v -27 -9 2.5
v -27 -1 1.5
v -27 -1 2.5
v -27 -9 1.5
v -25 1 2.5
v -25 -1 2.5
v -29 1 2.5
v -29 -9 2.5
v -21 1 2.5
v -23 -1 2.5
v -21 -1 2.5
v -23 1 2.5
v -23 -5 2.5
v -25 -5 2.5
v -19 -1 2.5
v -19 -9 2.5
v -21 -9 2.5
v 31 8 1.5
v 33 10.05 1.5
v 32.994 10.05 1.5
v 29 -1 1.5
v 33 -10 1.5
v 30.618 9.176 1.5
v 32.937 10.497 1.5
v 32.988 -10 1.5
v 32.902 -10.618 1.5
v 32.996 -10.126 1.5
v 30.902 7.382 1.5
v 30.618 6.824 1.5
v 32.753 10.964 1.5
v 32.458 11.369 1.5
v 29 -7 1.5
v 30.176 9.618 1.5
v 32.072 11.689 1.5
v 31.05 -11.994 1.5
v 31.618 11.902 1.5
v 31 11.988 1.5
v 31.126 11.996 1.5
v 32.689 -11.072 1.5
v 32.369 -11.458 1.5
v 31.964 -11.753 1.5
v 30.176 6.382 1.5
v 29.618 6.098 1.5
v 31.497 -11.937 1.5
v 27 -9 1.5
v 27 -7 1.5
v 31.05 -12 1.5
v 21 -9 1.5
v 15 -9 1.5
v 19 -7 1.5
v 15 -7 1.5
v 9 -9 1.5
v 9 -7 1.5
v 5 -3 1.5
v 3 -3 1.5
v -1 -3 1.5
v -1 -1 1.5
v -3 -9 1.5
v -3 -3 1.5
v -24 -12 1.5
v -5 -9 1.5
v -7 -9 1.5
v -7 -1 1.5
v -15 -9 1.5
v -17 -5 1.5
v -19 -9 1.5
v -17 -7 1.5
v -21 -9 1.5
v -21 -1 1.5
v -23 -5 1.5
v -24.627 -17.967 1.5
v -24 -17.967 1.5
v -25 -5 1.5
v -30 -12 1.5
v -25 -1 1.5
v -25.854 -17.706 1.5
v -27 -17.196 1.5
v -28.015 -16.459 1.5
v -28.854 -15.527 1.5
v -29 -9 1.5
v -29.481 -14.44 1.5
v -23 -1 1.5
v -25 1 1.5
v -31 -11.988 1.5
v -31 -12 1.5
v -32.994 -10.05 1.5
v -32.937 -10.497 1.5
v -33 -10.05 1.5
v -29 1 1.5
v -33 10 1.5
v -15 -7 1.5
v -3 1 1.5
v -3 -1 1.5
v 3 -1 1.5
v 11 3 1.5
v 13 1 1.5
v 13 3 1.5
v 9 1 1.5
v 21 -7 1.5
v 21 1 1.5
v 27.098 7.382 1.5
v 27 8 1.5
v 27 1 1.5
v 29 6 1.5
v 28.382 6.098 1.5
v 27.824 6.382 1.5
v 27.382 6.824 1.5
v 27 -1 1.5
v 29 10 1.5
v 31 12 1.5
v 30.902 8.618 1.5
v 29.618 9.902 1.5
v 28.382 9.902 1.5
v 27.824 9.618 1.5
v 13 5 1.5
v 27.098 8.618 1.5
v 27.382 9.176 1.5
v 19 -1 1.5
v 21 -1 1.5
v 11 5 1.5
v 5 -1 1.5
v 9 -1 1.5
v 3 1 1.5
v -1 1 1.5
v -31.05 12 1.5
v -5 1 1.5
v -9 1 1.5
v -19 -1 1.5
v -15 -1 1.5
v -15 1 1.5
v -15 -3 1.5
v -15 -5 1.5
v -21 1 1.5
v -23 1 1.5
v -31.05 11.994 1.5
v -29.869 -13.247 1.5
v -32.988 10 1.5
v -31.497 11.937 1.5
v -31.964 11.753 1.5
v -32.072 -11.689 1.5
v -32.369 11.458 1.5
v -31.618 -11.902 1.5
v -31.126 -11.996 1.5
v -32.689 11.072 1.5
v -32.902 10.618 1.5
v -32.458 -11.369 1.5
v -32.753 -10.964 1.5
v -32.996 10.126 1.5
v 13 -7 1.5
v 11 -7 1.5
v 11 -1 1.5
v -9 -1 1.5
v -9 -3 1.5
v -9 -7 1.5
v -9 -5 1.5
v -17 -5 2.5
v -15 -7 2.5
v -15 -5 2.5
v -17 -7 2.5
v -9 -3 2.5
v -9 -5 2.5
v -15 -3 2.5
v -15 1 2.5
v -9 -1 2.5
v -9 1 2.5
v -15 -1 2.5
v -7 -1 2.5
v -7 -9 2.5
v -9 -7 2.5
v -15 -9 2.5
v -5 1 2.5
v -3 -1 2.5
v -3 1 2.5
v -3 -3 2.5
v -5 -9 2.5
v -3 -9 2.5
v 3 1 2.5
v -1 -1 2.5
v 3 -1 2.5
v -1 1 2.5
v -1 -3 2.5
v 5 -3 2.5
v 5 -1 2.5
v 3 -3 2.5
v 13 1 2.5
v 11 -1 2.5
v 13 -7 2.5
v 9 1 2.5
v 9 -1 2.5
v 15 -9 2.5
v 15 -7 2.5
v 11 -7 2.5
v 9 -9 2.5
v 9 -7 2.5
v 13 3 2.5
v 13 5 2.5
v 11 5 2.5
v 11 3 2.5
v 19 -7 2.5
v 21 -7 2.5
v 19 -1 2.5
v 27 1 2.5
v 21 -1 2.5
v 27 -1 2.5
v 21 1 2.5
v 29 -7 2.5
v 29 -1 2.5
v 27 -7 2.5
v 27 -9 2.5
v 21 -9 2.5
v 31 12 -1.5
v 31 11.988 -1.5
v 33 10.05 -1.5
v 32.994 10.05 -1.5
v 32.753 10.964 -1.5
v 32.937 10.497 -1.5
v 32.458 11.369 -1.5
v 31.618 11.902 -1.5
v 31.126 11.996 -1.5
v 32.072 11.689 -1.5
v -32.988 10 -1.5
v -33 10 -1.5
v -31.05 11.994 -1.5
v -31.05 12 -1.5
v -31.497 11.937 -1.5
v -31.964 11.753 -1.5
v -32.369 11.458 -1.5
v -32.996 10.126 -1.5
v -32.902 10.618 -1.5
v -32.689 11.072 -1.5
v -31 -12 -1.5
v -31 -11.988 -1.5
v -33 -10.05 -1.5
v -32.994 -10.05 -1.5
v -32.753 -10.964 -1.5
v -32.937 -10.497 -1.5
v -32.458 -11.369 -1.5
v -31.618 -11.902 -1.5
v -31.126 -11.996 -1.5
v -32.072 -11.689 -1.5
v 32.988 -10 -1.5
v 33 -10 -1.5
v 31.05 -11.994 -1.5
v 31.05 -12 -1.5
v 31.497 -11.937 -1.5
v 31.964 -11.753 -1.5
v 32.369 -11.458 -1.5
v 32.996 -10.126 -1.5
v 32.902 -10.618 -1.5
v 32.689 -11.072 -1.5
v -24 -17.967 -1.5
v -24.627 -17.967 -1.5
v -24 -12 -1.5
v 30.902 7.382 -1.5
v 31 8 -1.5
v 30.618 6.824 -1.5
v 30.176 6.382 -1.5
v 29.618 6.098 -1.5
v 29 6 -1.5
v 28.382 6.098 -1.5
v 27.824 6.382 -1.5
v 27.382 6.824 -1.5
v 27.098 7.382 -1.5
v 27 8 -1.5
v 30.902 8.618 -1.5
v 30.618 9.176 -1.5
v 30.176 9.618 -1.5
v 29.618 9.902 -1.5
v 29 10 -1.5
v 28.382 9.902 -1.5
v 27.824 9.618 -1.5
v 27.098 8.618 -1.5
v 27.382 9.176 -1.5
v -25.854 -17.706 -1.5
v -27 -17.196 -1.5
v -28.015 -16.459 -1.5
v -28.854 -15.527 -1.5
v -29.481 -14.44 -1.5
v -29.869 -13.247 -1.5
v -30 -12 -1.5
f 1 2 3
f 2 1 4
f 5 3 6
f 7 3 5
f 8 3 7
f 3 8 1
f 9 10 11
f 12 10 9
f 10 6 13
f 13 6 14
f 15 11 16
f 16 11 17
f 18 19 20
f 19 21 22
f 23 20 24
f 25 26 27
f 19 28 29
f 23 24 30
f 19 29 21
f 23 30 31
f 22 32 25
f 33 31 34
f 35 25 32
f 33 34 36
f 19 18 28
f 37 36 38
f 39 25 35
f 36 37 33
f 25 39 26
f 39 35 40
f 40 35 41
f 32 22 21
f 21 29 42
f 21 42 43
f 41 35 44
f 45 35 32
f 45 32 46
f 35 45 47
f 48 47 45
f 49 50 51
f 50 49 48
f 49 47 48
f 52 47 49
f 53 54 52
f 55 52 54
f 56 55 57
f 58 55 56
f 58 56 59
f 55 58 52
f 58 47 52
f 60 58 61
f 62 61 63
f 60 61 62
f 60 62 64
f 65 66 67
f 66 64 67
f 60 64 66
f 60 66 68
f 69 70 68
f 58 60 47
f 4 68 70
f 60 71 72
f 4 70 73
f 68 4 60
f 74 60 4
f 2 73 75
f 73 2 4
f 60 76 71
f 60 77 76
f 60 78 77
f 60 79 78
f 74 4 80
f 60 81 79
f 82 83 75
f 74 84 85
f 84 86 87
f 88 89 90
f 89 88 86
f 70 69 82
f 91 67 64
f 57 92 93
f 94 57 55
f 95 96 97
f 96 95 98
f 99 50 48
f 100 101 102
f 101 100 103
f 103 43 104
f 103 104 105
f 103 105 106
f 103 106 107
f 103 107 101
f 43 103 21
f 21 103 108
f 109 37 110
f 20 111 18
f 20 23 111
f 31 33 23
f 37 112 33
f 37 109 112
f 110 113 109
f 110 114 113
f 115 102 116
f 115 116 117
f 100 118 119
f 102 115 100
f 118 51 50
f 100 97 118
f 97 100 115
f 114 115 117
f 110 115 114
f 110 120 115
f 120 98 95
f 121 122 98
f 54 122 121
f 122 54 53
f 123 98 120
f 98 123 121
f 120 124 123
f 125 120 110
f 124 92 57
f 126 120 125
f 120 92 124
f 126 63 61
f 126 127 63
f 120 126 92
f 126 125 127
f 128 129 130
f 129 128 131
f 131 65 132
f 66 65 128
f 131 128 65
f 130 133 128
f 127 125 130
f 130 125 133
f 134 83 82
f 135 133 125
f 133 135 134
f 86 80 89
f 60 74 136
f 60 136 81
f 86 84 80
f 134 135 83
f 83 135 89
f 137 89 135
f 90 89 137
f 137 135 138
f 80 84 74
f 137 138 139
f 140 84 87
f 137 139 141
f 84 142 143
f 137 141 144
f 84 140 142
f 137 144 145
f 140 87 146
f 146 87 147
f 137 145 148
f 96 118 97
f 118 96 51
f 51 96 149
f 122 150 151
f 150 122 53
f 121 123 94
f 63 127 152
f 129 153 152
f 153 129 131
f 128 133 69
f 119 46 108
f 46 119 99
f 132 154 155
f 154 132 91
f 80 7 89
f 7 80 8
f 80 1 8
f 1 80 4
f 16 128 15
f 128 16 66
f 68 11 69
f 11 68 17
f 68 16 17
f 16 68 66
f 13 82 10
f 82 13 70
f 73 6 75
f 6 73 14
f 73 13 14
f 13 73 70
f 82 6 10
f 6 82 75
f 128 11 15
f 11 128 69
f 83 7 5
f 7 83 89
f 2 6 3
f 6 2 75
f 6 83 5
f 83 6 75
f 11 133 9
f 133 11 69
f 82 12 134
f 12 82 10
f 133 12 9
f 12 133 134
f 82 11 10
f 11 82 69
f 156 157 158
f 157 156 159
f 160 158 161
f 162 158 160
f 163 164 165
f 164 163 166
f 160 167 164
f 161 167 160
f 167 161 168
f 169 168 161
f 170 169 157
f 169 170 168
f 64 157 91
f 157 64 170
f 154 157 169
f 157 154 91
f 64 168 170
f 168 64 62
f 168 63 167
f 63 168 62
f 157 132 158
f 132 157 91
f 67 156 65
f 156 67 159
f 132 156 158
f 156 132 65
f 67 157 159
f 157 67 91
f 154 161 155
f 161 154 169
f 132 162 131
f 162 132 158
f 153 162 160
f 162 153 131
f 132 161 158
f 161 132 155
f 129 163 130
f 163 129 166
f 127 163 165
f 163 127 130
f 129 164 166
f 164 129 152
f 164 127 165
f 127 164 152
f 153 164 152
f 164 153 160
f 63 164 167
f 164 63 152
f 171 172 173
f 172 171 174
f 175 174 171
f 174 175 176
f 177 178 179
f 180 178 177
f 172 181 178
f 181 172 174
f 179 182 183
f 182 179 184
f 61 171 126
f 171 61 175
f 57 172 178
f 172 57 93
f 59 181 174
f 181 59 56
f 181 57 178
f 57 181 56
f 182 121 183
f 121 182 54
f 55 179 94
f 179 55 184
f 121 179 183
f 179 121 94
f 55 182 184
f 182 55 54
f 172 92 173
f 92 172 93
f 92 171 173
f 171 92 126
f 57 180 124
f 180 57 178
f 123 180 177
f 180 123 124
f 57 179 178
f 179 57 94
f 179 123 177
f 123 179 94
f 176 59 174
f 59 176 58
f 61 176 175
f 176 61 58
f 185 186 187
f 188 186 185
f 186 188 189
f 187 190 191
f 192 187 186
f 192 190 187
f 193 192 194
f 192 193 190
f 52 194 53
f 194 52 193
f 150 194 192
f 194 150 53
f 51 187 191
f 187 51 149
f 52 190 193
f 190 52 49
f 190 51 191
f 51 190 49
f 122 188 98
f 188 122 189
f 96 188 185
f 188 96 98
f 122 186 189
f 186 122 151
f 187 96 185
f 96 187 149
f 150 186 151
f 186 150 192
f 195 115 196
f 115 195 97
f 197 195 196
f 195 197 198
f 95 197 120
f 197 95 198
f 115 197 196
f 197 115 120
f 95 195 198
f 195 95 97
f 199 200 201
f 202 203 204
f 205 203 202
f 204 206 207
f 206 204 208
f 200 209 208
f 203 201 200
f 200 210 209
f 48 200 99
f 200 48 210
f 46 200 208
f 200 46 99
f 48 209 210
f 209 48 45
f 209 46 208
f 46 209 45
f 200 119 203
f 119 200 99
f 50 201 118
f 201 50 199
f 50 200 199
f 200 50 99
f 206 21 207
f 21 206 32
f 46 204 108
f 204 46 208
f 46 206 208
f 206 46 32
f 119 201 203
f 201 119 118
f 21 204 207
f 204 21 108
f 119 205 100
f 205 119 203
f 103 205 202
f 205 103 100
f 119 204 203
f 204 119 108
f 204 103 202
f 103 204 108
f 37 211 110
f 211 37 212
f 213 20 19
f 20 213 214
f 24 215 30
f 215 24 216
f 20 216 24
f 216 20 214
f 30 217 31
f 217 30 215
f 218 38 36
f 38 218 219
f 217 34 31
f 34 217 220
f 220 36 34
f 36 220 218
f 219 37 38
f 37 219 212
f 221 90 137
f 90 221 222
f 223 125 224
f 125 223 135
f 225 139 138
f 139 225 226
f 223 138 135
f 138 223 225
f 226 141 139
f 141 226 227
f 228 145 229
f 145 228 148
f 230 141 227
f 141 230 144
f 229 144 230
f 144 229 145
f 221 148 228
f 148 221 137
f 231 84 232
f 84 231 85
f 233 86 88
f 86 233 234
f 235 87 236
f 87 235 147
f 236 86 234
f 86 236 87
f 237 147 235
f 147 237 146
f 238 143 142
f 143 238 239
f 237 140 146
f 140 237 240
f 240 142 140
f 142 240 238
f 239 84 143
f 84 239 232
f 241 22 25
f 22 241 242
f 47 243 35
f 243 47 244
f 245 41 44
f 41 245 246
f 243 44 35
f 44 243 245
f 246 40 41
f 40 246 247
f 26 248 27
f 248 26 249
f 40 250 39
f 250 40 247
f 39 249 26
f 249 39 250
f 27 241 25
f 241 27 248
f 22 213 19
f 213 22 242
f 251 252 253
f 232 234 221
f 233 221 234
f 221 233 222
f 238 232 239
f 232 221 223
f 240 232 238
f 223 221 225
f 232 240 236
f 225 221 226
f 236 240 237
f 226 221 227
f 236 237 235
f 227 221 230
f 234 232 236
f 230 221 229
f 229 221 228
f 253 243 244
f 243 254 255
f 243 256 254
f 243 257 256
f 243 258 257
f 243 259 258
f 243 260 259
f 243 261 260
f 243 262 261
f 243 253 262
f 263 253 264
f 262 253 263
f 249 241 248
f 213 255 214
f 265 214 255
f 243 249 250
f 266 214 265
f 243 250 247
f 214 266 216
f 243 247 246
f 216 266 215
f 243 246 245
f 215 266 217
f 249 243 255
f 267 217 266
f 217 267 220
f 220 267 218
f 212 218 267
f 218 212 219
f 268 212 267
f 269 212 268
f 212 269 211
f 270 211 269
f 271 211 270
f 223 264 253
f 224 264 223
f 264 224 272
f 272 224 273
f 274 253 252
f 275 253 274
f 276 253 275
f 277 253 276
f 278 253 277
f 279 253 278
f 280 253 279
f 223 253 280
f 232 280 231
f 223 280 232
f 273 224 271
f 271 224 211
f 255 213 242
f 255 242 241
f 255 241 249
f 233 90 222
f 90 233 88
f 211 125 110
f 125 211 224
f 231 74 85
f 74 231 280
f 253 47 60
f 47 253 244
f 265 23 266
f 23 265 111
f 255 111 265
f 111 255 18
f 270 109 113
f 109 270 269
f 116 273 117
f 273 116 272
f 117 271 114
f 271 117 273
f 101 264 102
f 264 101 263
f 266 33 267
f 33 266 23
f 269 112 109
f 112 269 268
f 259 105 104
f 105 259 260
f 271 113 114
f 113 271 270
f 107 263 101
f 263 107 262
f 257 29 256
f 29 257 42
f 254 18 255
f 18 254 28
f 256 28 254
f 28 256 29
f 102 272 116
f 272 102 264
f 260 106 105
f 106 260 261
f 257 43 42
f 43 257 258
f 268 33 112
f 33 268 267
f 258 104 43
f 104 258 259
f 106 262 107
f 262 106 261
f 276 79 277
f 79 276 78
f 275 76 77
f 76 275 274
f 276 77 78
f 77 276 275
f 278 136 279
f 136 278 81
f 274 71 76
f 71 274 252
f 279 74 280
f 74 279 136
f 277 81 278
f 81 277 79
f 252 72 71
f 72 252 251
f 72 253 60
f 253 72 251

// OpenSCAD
/*
call out name plate generator

Copyright (C) 2014 Matteo Zandi
Released under the GPL v3
*/

// What you want to be written on the plate
text = "mario";

// (default = 2 = 12mm wide * 14mm tall character)
font_size = 2;

// (in mm, default = 2, 0 for none)
hanger_hole_radius = 2;

// (in mm, default = 3)
height = 3;

// (in mm, default = 1)
text_height = 1;

// ignore variable values
corner = 2*1; // round cube corner size
margin = 2*1;

text_length = (len(text)*6-1)*font_size;
text_width = 7*font_size;

// text
translate([-text_length/2, -text_width/2-hanger_hole_radius, height/2]) color("orange") scale([font_size, font_size, text_height]) drawtext(text);

// plate size
length = text_length + 2*hanger_hole_radius + 2*margin; //60
width = text_width + 2*hanger_hole_radius + 3*margin; //24;

difference() {
  roundCornersCube(length, width, height, corner);
  translate([length/2-2-hanger_hole_radius, width/2-2-hanger_hole_radius, -height]) cylinder(r=hanger_hole_radius, h=height*2, $fn=20);
}

// call out
call_out_size = width/4;
translate([call_out_size-length/2+3, -width/2, -height/2]) intersection() {
  cylinder(r=call_out_size, h=height, $fn=30);
  translate([-call_out_size, -call_out_size, 0]) cube([call_out_size, call_out_size, height]);
}

/* roundCornersCube

http://codeviewer.org/view/code:1b36 
Copyright (C) 2011 Sergio Vilches
This program is free software: you can redistribute it and/or modify it under the terms of the GNU General Public License as published by the Free Software Foundation, either version 3 of the License, or (at your option) any later version.
This program is distributed in the hope that it will be useful, but WITHOUT ANY WARRANTY; without even the implied warranty of MERCHANTABILITY or FITNESS FOR A PARTICULAR PURPOSE. See the GNU General Public License for more details. You should have received a copy of the GNU General Public License along with this program. If not, see <http://www.gnu.org/licenses/>.
Contact: s.vilches.e@gmail.com


    ----------------------------------------------------------- 
                 Round Corners Cube (Extruded)                
      roundCornersCube(x,y,z,r) Where:                        
         - x = Xdir width                                     
         - y = Ydir width                                     
         - z = Height of the cube                             
         - r = Rounding radious                               
                                                              
      Example: roundCornerCube(10,10,2,1);                    
     *Some times it's needed to use F6 to see good results!   
 	 ----------------------------------------------------------- 
*/
// Test it!
// roundCornersCube(10,5,2,1);


module createMeniscus(h,radius) // This module creates the shape that needs to be substracted from a cube to make its corners rounded.
difference(){        //This shape is basicly the difference between a quarter of cylinder and a cube
   translate([radius/2+0.1,radius/2+0.1,0]){
      cube([radius+0.2,radius+0.1,h+0.2],center=true);         // All that 0.x numbers are to avoid "ghost boundaries" when substracting
   }

   cylinder(h=h+0.2,r=radius,$fn = 25,center=true);
}


module roundCornersCube(x,y,z,r)  // Now we just substract the shape we have created in the four corners
difference(){
   cube([x,y,z], center=true);

translate([x/2-r,y/2-r]){  // We move to the first corner (x,y)
      rotate(0){  
         createMeniscus(z,r); // And substract the meniscus
      }
   }
   translate([-x/2+r,y/2-r]){ // To the second corner (-x,y)
      rotate(90){
         createMeniscus(z,r); // But this time we have to rotate the meniscus 90 deg
      }
   }
      translate([-x/2+r,-y/2+r]){ // ... 
      rotate(180){
         createMeniscus(z,r);
      }
   }
      translate([x/2-r,-y/2+r]){
      rotate(270){
         createMeniscus(z,r);
      }
   }
}

/* textGenerator
https://www.thingiverse.com/thing:59817

OpenSCAD 3D Text Generator by pgreenland is licensed under the Creative Commons - Attribution - Share Alike license.
*/
module drawtext(text) {
	//Characters
	chars = " !\"#$%&'()*+,-./0123456789:;<=>?@ABCDEFGHIJKLMNOPQRSTUVWXYZ[\\]^_`abcdefghijklmnopqrstuvwxyz{|}";

	//Chracter table defining 5x7 characters
	//Adapted from: http://www.geocities.com/dinceraydin/djlcdsim/chartable.js
	char_table = [ [ 0, 0, 0, 0, 0, 0, 0],
                  [ 4, 0, 4, 4, 4, 4, 4],
                  [ 0, 0, 0, 0,10,10,10],
                  [10,10,31,10,31,10,10],
                  [ 4,30, 5,14,20,15, 4],
                  [ 3,19, 8, 4, 2,25,24],
                  [13,18,21, 8,20,18,12],
                  [ 0, 0, 0, 0, 8, 4,12],
                  [ 2, 4, 8, 8, 8, 4, 2],
                  [ 8, 4, 2, 2, 2, 4, 8],
                  [ 0, 4,21,14,21, 4, 0],
                  [ 0, 4, 4,31, 4, 4, 0],
                  [ 8, 4,12, 0, 0, 0, 0],
                  [ 0, 0, 0,31, 0, 0, 0],
                  [12,12, 0, 0, 0, 0, 0],
                  [ 0,16, 8, 4, 2, 1, 0],
                  [14,17,25,21,19,17,14],
                  [14, 4, 4, 4, 4,12, 4],
                  [31, 8, 4, 2, 1,17,14],
                  [14,17, 1, 2, 4, 2,31],
                  [ 2, 2,31,18,10, 6, 2],
                  [14,17, 1, 1,30,16,31],
                  [14,17,17,30,16, 8, 6],
                  [ 8, 8, 8, 4, 2, 1,31],
                  [14,17,17,14,17,17,14],
                  [12, 2, 1,15,17,17,14],
                  [ 0,12,12, 0,12,12, 0],
                  [ 8, 4,12, 0,12,12, 0],
                  [ 2, 4, 8,16, 8, 4, 2],
                  [ 0, 0,31, 0,31, 0, 0],
                  [16, 8, 4, 2, 4, 8,16],
                  [ 4, 0, 4, 2, 1,17,14],
                  [14,21,21,13, 1,17,14],
                  [17,17,31,17,17,17,14],
                  [30,17,17,30,17,17,30],
                  [14,17,16,16,16,17,14],
                  [30,17,17,17,17,17,30],
                  [31,16,16,30,16,16,31],
                  [16,16,16,30,16,16,31],
                  [15,17,17,23,16,17,14],
                  [17,17,17,31,17,17,17],
                  [14, 4, 4, 4, 4, 4,14],
                  [12,18, 2, 2, 2, 2, 7],
                  [17,18,20,24,20,18,17],
                  [31,16,16,16,16,16,16],
                  [17,17,17,21,21,27,17],
                  [17,17,19,21,25,17,17],
                  [14,17,17,17,17,17,14],
                  [16,16,16,30,17,17,30],
                  [13,18,21,17,17,17,14],
                  [17,18,20,30,17,17,30],
                  [30, 1, 1,14,16,16,15],
                  [ 4, 4, 4, 4, 4, 4,31],
                  [14,17,17,17,17,17,17],
                  [ 4,10,17,17,17,17,17],
                  [10,21,21,21,17,17,17],
                  [17,17,10, 4,10,17,17],
                  [ 4, 4, 4,10,17,17,17],
                  [31,16, 8, 4, 2, 1,31],
                  [14, 8, 8, 8, 8, 8,14],
                  [ 0, 1, 2, 4, 8,16, 0],
                  [14, 2, 2, 2, 2, 2,14],
                  [ 0, 0, 0, 0,17,10, 4],
                  [31, 0, 0, 0, 0, 0, 0],
                  [ 0, 0, 0, 0, 2, 4, 8],
                  [15,17,15, 1,14, 0, 0],
                  [30,17,17,25,22,16,16],
                  [14,17,16,16,14, 0, 0],
                  [15,17,17,19,13, 1, 1],
                  [14,16,31,17,14, 0, 0],
                  [ 8, 8, 8,28, 8, 9, 6],
                  [14, 1,15,17,15, 0, 0],
                  [17,17,17,25,22,16,16],
                  [14, 4, 4, 4,12, 0, 4],
                  [12,18, 2, 2, 2, 6, 2],
                  [18,20,24,20,18,16,16],
                  [14, 4, 4, 4, 4, 4,12],
                  [17,17,21,21,26, 0, 0],
                  [17,17,17,25,22, 0, 0],
                  [14,17,17,17,14, 0, 0],
                  [16,16,30,17,30, 0, 0],
                  [ 1, 1,15,19,13, 0, 0],
                  [16,16,16,25,22, 0, 0],
                  [30, 1,14,16,15, 0, 0],
                  [ 6, 9, 8, 8,28, 8, 8],
                  [13,19,17,17,17, 0, 0],
                  [ 4,10,17,17,17, 0, 0],
                  [10,21,21,17,17, 0, 0],
                  [17,10, 4,10,17, 0, 0],
                  [14, 1,15,17,17, 0, 0],
                  [31, 8, 4, 2,31, 0, 0],
                  [ 2, 4, 4, 8, 4, 4, 2],
                  [ 4, 4, 4, 4, 4, 4, 4],
                  [ 8, 4, 4, 2, 4, 4, 8] ];

	//Binary decode table
	dec_table = [ "00000", "00001", "00010", "00011", "00100", "00101",
  	            "00110", "00111", "01000", "01001", "01010", "01011",
  	            "01100", "01101", "01110", "01111", "10000", "10001",
  	            "10010", "10011", "10100", "10101", "10110", "10111",
	            "11000", "11001", "11010", "11011", "11100", "11101",
	            "11110", "11111" ];

	//Process string one character at a time
	for(itext = [0:len(text)-1]) {
		//Convert character to index
		assign(ichar = search(text[itext],chars,1)[0]) {
			//Decode character - rows
			for(irow = [0:6]) {
				assign(val = dec_table[char_table[ichar][irow]]) {
					//Decode character - cols
					for(icol = [0:4]) {
						assign(bit = search(val[icol],"01",1)[0]) {
							if(bit) {
								//Output cube
								translate([icol + (6*itext), irow, 0])
									cube([1.0001,1.0001,1]);
							}
						}
					}
				}
			}
		}
	}
}
